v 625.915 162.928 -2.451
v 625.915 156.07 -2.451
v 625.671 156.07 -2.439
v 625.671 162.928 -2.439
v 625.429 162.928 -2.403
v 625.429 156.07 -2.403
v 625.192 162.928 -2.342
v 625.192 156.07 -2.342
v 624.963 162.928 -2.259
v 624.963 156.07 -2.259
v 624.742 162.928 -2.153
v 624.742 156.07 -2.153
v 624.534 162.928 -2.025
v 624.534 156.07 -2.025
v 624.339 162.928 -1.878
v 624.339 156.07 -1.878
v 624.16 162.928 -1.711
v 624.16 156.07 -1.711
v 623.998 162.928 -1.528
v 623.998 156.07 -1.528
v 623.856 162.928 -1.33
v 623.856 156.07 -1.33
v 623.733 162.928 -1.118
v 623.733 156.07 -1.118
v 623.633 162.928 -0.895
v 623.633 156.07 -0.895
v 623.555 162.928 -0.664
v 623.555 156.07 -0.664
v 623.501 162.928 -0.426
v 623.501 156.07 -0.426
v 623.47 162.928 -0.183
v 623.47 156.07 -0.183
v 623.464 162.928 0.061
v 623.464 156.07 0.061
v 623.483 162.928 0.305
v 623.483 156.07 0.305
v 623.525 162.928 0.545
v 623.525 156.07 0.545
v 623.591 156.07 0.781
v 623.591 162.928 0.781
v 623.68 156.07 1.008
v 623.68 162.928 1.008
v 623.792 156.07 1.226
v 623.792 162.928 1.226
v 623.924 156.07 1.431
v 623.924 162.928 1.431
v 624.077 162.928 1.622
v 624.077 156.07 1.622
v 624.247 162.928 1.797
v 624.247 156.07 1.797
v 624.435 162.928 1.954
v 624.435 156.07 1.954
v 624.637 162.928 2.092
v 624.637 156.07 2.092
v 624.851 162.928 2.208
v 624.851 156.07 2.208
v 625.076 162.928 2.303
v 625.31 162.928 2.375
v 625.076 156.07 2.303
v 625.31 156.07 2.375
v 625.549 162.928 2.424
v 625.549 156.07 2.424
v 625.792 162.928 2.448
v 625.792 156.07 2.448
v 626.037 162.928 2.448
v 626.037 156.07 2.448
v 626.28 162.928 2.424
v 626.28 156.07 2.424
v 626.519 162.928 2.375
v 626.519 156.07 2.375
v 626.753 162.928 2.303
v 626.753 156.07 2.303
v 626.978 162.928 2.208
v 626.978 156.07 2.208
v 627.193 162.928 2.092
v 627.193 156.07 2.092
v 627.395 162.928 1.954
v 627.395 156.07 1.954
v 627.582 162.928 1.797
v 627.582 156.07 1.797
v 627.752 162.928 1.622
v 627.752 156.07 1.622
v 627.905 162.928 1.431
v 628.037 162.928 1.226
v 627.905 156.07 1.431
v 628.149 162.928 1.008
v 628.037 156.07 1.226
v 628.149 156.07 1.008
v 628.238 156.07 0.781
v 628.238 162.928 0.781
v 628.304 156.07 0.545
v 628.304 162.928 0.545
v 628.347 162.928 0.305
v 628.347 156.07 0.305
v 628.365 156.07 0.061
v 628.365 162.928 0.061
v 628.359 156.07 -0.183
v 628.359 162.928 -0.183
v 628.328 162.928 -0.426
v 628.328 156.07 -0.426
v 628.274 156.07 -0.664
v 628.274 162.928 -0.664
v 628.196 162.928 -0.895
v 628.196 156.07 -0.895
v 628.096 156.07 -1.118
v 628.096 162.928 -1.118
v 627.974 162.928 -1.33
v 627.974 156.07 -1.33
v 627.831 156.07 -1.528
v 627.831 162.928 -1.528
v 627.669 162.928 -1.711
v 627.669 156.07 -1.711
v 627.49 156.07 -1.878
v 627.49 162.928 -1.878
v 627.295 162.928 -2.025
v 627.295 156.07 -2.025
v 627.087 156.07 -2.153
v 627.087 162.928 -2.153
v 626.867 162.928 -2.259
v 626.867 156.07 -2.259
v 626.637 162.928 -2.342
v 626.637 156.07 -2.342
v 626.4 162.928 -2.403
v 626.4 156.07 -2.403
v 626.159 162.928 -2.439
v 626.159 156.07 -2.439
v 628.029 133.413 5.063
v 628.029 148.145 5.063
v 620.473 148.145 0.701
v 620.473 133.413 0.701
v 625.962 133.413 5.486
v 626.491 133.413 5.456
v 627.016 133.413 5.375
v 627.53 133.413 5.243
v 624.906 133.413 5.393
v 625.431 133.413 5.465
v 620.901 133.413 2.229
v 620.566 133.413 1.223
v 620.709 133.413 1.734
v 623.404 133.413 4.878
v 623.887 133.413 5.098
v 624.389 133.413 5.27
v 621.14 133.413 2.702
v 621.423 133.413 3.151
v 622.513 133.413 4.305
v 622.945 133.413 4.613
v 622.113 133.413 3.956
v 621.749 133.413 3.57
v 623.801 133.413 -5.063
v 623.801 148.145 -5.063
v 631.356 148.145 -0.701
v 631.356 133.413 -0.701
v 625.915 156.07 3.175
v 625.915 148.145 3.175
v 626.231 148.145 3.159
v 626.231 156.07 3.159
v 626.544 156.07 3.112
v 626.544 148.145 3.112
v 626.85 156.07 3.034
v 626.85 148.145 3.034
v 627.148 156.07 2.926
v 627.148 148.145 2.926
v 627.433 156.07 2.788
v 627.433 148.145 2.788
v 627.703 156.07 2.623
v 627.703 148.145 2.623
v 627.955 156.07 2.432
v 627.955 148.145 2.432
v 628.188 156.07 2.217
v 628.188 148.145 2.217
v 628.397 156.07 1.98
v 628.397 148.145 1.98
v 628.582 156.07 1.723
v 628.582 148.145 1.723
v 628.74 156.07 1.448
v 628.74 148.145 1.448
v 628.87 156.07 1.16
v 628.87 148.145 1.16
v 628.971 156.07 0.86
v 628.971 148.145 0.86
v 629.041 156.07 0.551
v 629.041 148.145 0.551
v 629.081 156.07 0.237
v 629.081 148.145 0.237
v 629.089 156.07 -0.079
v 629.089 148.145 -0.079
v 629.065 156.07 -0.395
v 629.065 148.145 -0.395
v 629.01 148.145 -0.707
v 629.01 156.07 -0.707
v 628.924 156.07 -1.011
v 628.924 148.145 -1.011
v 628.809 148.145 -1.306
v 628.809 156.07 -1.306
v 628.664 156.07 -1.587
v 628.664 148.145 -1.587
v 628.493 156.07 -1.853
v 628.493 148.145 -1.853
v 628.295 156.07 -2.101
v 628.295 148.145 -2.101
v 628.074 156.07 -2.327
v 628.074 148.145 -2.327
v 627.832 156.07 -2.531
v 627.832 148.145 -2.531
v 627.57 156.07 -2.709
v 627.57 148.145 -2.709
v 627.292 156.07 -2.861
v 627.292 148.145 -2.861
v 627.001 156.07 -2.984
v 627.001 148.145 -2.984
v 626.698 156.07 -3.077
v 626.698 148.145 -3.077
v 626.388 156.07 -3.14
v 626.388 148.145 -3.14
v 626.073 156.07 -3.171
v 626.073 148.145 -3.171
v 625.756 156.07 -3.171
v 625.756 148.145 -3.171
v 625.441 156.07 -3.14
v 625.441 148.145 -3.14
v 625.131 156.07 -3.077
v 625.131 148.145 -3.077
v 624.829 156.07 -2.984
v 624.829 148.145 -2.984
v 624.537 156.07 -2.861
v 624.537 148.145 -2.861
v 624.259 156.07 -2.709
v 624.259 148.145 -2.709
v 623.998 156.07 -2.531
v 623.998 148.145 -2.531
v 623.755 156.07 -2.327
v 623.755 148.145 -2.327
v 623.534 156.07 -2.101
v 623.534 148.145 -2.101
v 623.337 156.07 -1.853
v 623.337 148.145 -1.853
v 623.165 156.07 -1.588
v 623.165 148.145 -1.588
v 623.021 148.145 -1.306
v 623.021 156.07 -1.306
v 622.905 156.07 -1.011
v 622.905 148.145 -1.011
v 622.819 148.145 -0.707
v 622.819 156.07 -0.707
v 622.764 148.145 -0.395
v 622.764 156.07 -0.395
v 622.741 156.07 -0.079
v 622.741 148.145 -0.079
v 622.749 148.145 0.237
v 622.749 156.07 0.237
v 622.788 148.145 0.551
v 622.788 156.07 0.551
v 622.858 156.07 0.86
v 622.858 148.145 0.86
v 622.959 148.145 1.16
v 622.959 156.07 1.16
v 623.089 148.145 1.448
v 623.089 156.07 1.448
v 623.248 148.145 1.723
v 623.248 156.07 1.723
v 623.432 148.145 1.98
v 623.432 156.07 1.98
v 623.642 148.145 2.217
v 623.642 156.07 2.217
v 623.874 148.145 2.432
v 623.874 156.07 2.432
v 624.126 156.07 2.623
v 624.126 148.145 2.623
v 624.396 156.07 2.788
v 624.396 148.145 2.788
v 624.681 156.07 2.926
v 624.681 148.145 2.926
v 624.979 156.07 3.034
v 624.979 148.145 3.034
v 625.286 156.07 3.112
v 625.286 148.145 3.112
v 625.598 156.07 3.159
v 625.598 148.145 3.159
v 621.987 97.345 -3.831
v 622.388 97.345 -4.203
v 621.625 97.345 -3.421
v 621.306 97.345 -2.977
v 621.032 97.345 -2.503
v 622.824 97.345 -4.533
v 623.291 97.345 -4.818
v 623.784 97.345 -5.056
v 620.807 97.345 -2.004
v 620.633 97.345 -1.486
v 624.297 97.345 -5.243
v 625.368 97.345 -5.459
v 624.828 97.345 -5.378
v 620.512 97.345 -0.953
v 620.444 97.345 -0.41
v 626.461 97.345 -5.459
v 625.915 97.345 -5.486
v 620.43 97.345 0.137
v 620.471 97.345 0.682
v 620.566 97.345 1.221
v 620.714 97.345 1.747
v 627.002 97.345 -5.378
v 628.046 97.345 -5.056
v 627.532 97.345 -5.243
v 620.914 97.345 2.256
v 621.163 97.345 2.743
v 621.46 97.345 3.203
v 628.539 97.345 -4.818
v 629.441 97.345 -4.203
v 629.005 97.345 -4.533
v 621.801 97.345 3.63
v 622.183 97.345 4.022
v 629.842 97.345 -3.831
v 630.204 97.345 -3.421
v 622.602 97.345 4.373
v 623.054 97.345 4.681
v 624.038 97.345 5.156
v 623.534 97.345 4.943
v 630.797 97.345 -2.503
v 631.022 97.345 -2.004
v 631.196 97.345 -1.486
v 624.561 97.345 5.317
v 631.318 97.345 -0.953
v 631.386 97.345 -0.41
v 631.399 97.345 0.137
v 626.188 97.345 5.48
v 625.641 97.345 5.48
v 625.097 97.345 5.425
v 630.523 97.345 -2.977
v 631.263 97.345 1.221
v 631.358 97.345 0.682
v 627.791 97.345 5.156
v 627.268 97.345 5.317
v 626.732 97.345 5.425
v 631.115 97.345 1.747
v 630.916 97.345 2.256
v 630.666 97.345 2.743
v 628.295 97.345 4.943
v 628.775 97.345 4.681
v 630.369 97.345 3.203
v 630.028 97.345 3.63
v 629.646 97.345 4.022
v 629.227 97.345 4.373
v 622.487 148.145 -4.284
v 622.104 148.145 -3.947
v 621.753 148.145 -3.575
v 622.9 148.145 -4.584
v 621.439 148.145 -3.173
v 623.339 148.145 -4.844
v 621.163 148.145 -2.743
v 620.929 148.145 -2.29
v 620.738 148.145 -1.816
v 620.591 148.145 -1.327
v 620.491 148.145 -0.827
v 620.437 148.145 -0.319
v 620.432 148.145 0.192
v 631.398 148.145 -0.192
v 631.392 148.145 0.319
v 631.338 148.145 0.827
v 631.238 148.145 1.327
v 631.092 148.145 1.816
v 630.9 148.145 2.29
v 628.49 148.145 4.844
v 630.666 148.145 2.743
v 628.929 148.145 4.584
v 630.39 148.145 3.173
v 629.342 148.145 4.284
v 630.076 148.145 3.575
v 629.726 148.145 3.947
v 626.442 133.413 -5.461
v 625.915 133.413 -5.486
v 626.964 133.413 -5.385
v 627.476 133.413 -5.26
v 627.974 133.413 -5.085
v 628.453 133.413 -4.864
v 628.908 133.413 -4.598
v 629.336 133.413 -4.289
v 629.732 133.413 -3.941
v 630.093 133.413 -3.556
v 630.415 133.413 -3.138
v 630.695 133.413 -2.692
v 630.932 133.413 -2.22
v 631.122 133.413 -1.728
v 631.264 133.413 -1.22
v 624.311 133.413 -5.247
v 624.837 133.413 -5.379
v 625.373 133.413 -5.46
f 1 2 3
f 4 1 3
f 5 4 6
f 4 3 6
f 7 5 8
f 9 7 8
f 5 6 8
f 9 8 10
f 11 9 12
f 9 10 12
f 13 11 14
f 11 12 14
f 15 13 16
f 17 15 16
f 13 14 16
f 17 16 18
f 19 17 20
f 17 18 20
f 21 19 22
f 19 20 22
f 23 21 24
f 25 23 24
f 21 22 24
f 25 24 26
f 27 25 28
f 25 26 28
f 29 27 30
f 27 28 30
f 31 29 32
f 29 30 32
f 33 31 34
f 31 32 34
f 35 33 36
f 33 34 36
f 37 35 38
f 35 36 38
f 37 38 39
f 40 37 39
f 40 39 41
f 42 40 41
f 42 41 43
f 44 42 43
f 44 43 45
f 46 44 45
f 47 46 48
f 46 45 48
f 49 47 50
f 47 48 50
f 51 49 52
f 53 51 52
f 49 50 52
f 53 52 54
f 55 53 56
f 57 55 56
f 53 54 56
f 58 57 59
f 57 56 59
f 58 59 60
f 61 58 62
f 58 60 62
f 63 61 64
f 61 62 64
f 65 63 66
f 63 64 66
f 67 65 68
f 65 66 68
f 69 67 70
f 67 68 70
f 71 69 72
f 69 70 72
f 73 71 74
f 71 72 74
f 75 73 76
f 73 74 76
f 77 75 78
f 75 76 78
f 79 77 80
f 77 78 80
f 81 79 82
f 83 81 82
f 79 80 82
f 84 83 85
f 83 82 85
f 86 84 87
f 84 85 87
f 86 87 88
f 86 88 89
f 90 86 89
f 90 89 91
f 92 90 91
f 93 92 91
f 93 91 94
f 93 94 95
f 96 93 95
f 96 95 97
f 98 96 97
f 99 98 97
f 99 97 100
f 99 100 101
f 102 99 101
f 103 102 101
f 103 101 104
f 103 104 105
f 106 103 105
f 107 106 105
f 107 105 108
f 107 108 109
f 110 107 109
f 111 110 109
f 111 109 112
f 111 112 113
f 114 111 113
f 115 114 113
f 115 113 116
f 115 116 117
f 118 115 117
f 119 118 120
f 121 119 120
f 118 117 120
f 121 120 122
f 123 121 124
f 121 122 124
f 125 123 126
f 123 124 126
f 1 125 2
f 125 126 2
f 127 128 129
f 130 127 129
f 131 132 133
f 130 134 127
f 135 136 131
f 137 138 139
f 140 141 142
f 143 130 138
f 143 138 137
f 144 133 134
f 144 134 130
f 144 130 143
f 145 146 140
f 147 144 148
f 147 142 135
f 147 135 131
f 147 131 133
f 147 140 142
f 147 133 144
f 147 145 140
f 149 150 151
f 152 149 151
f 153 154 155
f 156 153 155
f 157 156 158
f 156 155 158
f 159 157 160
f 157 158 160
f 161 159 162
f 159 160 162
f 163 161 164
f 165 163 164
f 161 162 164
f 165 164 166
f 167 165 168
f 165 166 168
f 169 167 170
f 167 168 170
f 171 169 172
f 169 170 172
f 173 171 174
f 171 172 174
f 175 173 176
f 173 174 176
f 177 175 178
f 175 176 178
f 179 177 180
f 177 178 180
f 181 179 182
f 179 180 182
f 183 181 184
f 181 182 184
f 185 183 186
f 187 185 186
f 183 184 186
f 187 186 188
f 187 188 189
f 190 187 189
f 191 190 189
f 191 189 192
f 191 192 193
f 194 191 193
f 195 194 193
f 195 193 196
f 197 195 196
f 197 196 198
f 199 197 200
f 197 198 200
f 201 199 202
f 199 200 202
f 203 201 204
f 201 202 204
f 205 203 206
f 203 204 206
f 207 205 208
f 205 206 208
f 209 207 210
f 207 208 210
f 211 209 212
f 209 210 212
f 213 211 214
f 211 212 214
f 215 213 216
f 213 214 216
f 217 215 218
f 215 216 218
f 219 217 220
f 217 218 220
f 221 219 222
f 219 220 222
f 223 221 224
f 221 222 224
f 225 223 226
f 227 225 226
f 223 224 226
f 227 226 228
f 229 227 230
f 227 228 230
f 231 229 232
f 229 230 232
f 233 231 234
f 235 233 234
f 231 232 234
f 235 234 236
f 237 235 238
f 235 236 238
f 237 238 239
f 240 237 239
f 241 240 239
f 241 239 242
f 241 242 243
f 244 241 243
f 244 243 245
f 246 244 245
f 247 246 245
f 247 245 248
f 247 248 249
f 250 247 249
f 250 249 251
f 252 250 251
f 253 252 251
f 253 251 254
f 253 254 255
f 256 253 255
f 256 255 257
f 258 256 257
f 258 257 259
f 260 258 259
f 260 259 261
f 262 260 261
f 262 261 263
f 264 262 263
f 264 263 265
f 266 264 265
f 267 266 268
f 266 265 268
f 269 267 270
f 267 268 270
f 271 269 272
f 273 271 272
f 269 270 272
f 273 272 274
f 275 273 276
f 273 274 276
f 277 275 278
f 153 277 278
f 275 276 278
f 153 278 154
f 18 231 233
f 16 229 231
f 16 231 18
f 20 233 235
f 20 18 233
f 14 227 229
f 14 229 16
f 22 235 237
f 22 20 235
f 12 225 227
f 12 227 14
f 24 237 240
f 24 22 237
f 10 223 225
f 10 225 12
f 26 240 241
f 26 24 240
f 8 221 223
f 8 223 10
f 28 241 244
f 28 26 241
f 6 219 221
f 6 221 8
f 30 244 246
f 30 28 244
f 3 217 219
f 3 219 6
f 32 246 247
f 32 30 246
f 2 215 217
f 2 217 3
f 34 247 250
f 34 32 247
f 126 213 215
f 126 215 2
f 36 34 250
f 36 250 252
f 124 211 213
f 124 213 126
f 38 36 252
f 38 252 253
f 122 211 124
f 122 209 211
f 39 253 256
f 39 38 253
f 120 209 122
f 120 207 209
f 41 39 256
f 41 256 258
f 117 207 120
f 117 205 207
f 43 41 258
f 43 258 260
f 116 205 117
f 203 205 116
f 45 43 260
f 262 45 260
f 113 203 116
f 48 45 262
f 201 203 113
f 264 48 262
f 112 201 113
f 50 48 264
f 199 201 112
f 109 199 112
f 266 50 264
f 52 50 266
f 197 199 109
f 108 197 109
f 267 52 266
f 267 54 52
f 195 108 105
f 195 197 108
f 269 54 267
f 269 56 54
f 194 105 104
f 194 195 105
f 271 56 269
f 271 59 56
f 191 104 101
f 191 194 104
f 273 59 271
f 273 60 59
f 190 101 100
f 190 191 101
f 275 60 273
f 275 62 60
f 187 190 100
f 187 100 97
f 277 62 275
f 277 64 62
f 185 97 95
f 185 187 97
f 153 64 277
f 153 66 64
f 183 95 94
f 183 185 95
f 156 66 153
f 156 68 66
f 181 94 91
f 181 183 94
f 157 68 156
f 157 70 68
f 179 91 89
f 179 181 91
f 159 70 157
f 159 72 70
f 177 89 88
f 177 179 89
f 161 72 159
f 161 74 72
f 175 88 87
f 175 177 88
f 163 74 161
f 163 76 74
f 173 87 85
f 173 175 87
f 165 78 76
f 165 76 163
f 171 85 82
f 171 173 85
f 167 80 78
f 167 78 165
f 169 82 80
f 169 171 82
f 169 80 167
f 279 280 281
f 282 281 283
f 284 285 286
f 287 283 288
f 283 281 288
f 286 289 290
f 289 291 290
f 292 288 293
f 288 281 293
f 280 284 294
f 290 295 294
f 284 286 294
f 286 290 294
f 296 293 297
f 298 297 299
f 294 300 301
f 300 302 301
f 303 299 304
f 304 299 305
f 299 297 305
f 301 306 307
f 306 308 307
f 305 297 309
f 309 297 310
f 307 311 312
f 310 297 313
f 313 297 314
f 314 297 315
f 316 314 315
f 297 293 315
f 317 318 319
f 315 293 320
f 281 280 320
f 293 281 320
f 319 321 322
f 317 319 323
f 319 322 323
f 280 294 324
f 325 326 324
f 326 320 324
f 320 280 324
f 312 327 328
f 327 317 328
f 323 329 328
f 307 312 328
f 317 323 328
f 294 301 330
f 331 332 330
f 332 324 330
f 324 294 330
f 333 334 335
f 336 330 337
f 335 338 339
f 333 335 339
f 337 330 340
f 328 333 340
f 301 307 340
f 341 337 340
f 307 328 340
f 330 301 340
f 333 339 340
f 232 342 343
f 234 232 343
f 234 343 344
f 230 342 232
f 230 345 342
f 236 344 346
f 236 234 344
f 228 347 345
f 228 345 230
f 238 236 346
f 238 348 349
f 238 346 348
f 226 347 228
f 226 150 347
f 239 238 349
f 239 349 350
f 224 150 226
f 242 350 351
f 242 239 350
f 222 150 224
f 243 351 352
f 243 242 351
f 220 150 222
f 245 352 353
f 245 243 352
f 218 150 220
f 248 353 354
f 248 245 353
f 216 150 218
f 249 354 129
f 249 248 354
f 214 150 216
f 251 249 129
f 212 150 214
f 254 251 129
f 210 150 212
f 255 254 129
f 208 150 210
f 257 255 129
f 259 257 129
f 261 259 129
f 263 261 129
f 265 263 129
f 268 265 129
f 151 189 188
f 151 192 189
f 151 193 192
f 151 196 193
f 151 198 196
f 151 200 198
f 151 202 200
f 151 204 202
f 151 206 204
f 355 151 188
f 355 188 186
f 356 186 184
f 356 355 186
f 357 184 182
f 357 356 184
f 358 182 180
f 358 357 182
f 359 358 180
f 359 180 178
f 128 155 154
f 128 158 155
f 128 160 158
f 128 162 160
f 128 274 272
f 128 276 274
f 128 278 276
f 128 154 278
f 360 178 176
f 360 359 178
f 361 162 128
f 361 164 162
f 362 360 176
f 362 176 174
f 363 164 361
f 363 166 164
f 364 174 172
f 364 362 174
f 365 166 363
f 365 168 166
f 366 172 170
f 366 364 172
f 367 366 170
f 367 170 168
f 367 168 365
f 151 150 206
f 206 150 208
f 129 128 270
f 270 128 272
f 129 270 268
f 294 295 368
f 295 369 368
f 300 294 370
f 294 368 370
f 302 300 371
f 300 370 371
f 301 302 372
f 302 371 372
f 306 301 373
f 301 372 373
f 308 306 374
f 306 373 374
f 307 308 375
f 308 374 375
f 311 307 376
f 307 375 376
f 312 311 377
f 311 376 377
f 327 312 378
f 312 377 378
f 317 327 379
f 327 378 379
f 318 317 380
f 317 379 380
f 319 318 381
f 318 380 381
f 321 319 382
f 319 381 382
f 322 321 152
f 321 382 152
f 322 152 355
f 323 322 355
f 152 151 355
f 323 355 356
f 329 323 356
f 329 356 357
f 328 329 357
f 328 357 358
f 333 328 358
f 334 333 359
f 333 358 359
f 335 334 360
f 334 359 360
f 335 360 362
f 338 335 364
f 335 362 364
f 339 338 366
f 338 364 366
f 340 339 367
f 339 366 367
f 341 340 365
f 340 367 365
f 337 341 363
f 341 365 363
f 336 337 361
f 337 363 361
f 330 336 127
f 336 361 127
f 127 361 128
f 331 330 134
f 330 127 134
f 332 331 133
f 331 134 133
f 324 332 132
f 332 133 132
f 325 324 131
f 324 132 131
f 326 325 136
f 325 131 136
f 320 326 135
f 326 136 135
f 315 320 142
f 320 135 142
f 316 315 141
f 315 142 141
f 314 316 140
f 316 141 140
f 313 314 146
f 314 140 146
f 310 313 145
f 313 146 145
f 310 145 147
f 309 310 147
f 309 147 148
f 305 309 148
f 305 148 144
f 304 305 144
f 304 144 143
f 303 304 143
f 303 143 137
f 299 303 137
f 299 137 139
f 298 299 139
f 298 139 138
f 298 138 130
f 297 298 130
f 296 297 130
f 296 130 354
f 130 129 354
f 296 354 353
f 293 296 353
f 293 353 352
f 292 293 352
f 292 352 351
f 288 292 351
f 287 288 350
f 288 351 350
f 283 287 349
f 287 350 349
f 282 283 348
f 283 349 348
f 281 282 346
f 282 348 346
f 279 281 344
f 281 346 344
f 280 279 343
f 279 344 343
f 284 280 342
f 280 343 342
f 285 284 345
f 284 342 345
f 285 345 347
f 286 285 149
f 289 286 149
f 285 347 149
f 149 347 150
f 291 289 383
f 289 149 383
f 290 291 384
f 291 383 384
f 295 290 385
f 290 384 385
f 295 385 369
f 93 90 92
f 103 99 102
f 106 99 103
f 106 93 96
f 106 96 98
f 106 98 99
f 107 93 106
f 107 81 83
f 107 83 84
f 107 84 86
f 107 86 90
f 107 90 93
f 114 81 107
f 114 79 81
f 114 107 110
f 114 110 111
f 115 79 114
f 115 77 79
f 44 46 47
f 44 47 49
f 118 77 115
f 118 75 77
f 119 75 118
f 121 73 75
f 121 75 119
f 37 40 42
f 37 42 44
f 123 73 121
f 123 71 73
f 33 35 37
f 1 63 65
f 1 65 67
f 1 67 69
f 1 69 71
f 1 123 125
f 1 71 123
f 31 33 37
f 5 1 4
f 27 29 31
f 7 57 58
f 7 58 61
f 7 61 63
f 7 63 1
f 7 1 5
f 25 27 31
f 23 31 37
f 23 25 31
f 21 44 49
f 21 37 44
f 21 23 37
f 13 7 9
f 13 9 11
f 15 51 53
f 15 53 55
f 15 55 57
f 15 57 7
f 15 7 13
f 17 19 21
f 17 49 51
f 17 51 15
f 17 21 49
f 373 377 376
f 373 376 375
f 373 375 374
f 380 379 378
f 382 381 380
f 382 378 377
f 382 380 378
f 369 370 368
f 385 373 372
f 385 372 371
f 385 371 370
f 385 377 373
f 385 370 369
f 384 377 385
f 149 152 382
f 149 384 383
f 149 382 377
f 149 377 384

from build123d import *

# Parameters (mm, degrees)
SKETCH1_W           = 5.4864
SKETCH1_H           = 50.8
CUT_EXTRUDE1_DEPTH  = 14.732
CUT_EXTRUDE2_DEPTH  = 14.732
SKETCH4_R           = 3.175
BOSS_EXTRUDE1_DEPTH = 7.9248
SKETCH5_R           = 2.4511
BOSS_EXTRUDE2_DEPTH = 6.858


with BuildPart() as part:
    # Sketch1 → Revolve1 (revolve)
    with BuildSketch(Plane.XY, mode=Mode.PRIVATE) as revolve1_sk:
        with Locations((628.657823135, 122.745244002)):
            Rectangle(SKETCH1_W, SKETCH1_H)
    revolve(revolve1_sk.sketch.rotate(Axis((625.914623135, 148.145244002, 0), (0, -1, 0)), 270), axis=Axis((625.914623135, 148.145244002, 0), (0, -1, 0)))

    # Sketch2 → Cut-Extrude1 (cut)
    with BuildSketch(Plane(origin=(0, 148.145244002, 0), x_dir=(-1, 0, 0), z_dir=(0, 1, 0))):
        with BuildLine():
            Line((-628.028719536, 5.062724698), (-620.473126733, 0.700501159))
            ThreePointArc((-620.473126733, 0.700501159), (-623.171423135, 4.751361775), (-628.028719536, 5.062724698))
        make_face()
    extrude(amount=-CUT_EXTRUDE1_DEPTH, mode=Mode.SUBTRACT)

    # Sketch3 → Cut-Extrude2 (cut)
    with BuildSketch(Plane(origin=(0, 148.145244002, 0), x_dir=(-1, 0, 0), z_dir=(0, 1, 0))):
        with BuildLine():
            Line((-623.800526733, -5.062724698), (-631.356119536, -0.700501159))
            ThreePointArc((-631.356119536, -0.700501159), (-628.657823135, -4.751361775), (-623.800526733, -5.062724698))
        make_face()
    extrude(amount=-CUT_EXTRUDE2_DEPTH, mode=Mode.SUBTRACT)

    # Sketch4 → Boss-Extrude1 (add)
    with BuildSketch(Plane(origin=(0, 148.145244002, 0), x_dir=(-1, 0, 0), z_dir=(0, 1, 0))):
        with Locations(Location((-625.914623135, 0, 0), (0, 0, 90))):
            Circle(SKETCH4_R)
    extrude(amount=BOSS_EXTRUDE1_DEPTH)

    # Sketch5 → Boss-Extrude2 (add)
    with BuildSketch(Plane(origin=(0, 156.070044002, 0), x_dir=(-1, 0, 0), z_dir=(0, 1, 0))):
        with Locations(Location((-625.914623135, 0, 0), (0, 0, 270))):
            Circle(SKETCH5_R)
    extrude(amount=BOSS_EXTRUDE2_DEPTH)


solid = part.part
